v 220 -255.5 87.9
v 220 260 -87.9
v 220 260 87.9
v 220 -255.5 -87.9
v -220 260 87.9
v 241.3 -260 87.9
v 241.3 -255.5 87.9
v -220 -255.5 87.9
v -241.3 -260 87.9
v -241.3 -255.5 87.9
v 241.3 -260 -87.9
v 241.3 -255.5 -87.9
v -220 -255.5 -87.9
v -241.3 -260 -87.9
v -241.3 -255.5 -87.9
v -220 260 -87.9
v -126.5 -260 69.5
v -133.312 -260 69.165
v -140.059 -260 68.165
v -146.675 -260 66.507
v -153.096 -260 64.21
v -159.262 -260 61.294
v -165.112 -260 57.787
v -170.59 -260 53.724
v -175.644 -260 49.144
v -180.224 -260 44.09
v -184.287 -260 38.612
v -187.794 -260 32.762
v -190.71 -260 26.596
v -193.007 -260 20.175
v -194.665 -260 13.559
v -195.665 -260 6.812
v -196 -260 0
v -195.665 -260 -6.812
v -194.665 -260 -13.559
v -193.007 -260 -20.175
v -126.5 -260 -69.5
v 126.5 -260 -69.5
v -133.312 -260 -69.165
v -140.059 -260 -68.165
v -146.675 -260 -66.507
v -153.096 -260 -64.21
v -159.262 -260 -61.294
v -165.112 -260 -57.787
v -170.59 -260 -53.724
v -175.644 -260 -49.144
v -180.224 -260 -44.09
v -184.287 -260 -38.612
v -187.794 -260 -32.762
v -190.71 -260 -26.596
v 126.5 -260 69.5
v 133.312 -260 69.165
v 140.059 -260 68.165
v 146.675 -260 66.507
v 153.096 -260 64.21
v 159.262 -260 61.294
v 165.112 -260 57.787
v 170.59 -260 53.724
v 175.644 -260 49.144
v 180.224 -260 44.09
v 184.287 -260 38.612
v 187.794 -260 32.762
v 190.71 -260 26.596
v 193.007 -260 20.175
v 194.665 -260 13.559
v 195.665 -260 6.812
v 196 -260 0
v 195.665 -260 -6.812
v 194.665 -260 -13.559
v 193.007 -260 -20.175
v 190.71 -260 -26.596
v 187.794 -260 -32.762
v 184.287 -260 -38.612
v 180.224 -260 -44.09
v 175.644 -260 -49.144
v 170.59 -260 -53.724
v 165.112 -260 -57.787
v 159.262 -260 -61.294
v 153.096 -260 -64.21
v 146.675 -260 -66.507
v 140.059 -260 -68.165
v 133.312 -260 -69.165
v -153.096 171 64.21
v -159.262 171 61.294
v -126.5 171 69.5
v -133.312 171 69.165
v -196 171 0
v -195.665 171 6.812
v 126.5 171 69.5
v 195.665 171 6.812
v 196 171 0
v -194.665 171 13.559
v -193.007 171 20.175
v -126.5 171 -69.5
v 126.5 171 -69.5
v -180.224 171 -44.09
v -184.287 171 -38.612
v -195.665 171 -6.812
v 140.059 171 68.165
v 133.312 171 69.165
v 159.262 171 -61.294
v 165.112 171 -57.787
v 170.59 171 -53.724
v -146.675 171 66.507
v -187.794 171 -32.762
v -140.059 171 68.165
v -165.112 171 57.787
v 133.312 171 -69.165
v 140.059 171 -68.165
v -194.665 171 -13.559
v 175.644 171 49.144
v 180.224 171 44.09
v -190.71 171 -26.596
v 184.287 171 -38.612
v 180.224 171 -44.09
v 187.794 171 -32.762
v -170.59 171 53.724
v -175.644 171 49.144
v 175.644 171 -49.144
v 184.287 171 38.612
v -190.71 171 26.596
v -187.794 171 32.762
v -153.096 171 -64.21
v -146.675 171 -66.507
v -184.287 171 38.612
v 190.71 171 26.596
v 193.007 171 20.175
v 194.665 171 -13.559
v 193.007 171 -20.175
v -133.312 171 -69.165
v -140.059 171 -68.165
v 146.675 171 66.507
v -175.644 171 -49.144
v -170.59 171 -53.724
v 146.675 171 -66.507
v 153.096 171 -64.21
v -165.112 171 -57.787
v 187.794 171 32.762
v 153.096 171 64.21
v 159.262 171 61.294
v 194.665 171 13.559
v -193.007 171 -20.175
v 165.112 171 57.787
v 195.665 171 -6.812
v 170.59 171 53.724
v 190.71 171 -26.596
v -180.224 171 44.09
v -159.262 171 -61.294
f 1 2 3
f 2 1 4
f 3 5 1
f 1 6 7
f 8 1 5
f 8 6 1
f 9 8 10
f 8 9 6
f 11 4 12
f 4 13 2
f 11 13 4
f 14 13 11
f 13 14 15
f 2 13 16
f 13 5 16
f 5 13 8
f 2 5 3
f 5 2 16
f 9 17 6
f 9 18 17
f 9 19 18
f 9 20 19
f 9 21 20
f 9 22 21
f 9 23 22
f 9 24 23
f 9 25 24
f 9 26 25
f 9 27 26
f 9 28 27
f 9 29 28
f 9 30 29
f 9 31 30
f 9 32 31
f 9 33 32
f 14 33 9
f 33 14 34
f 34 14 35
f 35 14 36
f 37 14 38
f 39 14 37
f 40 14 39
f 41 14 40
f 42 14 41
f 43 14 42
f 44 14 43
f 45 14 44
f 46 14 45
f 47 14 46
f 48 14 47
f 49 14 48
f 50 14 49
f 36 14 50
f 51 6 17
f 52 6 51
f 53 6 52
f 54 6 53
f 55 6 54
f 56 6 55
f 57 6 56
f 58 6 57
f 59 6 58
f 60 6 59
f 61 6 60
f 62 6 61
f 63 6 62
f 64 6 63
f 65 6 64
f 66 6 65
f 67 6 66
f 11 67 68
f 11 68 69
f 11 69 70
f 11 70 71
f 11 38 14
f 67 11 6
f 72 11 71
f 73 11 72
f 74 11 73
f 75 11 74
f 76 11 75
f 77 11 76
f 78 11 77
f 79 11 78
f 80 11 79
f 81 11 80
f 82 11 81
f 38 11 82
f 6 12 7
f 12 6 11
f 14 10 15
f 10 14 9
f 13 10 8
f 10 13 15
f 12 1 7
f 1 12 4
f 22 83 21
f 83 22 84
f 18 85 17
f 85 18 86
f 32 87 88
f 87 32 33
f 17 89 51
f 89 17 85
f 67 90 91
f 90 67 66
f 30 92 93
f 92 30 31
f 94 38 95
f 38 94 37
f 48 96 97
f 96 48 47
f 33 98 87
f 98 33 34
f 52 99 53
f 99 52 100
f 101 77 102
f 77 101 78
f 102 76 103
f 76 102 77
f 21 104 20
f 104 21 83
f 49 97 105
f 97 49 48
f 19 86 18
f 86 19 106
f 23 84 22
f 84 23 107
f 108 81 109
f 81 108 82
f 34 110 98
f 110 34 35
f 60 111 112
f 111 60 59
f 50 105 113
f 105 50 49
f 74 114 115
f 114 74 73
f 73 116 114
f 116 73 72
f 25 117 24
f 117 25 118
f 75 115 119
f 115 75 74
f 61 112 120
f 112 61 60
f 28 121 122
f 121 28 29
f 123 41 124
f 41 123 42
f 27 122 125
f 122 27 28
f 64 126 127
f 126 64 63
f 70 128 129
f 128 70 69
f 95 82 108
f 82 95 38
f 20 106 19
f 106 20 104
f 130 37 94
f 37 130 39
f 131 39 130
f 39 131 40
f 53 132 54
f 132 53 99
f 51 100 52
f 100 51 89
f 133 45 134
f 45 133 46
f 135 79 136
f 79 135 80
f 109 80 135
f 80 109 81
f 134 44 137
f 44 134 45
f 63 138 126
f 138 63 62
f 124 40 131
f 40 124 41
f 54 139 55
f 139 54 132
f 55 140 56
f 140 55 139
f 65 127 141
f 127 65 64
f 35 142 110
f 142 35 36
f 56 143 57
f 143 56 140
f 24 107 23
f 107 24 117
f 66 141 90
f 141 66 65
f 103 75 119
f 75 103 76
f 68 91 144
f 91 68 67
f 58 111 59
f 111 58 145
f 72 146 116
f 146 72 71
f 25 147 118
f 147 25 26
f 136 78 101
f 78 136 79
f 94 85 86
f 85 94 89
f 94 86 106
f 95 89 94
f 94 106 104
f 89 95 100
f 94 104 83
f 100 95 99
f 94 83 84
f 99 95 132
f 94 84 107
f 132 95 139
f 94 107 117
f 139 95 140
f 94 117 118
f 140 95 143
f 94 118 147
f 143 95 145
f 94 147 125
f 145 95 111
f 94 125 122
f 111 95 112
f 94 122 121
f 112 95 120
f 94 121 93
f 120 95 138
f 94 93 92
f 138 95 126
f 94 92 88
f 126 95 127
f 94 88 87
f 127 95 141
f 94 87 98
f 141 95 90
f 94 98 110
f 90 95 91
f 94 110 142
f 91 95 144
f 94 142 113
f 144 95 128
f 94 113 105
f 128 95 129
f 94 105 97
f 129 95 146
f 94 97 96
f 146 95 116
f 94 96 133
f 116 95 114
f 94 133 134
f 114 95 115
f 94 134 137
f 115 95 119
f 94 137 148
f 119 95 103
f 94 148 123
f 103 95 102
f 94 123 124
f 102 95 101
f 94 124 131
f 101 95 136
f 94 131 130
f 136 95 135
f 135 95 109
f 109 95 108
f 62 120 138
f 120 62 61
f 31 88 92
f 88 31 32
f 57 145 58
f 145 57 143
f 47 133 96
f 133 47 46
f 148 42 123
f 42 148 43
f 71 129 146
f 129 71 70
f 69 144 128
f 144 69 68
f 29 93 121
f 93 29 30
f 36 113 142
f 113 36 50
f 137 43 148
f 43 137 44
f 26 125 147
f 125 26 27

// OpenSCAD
// ============================================================================
// Atom Lithography Machine — Parametric OpenSCAD Module (S7.2-03)
// ============================================================================
// part_id           : S7.2-03
// parent_bom_id     : S7.2
// subsystem         : S7
// part_name         : PXIe / AXIe dusuk-gurultulu enstruman sasisi ve arka-panel
// material          : Al 6061
// temp_stage        : 300 K (kabin)
// vacuum_grade      : Atmosfer
// tolerance         : <1 ps skew
// computed_mass_kg  : 16.50000
// envelope_mm       : 482.600 x 536.100 x 175.800
// design_maturity   : M0_M1_DETAILED_CAD_DESIGN_ONLY
// no_lab_measurement: true
// iec61508_certified: false
// semi_s2_certified : false
// Units: millimeters (mm)
// ============================================================================

$fn = 64;

// Nominal bounding envelope parameters (mm)
bbox_x = 482.6000;
bbox_y = 536.1000;
bbox_z = 175.8000;

// Part-specific parametric dimensions
u_start = 10;
u_count = 4;
slots = 18;
slot_pitch_mm = 20.32;

// Interface / port parameters (mm)

module part_S7_2_03() {
  difference() {
    union() {
      // PXIe 4U chassis outer body
      cube([440.000, 520.000, 175.800], center=true);
      // 19-inch front mounting ears
      translate([0.000, -257.750, 0.000]) cube([482.600, 4.500, 175.800], center=true);
    }
    // 18-slot open PXIe card bay
    translate([0.000, -45.000, 0.000]) rotate([90.000, 0.000, 0.000]) {
      hull() {
        translate([-126.500, 0, 0]) cylinder(d=139.000, h=432.000, center=true);
        translate([126.500, 0, 0]) cylinder(d=139.000, h=432.000, center=true);
      }
    }
  }
}

// World assembly mounting transform (global machine frame, mm / deg):
// translate([1480.000, -178.000, 578.950]) rotate([0.000, 0.000, 0.000]) part_S7_2_03();

part_S7_2_03();
